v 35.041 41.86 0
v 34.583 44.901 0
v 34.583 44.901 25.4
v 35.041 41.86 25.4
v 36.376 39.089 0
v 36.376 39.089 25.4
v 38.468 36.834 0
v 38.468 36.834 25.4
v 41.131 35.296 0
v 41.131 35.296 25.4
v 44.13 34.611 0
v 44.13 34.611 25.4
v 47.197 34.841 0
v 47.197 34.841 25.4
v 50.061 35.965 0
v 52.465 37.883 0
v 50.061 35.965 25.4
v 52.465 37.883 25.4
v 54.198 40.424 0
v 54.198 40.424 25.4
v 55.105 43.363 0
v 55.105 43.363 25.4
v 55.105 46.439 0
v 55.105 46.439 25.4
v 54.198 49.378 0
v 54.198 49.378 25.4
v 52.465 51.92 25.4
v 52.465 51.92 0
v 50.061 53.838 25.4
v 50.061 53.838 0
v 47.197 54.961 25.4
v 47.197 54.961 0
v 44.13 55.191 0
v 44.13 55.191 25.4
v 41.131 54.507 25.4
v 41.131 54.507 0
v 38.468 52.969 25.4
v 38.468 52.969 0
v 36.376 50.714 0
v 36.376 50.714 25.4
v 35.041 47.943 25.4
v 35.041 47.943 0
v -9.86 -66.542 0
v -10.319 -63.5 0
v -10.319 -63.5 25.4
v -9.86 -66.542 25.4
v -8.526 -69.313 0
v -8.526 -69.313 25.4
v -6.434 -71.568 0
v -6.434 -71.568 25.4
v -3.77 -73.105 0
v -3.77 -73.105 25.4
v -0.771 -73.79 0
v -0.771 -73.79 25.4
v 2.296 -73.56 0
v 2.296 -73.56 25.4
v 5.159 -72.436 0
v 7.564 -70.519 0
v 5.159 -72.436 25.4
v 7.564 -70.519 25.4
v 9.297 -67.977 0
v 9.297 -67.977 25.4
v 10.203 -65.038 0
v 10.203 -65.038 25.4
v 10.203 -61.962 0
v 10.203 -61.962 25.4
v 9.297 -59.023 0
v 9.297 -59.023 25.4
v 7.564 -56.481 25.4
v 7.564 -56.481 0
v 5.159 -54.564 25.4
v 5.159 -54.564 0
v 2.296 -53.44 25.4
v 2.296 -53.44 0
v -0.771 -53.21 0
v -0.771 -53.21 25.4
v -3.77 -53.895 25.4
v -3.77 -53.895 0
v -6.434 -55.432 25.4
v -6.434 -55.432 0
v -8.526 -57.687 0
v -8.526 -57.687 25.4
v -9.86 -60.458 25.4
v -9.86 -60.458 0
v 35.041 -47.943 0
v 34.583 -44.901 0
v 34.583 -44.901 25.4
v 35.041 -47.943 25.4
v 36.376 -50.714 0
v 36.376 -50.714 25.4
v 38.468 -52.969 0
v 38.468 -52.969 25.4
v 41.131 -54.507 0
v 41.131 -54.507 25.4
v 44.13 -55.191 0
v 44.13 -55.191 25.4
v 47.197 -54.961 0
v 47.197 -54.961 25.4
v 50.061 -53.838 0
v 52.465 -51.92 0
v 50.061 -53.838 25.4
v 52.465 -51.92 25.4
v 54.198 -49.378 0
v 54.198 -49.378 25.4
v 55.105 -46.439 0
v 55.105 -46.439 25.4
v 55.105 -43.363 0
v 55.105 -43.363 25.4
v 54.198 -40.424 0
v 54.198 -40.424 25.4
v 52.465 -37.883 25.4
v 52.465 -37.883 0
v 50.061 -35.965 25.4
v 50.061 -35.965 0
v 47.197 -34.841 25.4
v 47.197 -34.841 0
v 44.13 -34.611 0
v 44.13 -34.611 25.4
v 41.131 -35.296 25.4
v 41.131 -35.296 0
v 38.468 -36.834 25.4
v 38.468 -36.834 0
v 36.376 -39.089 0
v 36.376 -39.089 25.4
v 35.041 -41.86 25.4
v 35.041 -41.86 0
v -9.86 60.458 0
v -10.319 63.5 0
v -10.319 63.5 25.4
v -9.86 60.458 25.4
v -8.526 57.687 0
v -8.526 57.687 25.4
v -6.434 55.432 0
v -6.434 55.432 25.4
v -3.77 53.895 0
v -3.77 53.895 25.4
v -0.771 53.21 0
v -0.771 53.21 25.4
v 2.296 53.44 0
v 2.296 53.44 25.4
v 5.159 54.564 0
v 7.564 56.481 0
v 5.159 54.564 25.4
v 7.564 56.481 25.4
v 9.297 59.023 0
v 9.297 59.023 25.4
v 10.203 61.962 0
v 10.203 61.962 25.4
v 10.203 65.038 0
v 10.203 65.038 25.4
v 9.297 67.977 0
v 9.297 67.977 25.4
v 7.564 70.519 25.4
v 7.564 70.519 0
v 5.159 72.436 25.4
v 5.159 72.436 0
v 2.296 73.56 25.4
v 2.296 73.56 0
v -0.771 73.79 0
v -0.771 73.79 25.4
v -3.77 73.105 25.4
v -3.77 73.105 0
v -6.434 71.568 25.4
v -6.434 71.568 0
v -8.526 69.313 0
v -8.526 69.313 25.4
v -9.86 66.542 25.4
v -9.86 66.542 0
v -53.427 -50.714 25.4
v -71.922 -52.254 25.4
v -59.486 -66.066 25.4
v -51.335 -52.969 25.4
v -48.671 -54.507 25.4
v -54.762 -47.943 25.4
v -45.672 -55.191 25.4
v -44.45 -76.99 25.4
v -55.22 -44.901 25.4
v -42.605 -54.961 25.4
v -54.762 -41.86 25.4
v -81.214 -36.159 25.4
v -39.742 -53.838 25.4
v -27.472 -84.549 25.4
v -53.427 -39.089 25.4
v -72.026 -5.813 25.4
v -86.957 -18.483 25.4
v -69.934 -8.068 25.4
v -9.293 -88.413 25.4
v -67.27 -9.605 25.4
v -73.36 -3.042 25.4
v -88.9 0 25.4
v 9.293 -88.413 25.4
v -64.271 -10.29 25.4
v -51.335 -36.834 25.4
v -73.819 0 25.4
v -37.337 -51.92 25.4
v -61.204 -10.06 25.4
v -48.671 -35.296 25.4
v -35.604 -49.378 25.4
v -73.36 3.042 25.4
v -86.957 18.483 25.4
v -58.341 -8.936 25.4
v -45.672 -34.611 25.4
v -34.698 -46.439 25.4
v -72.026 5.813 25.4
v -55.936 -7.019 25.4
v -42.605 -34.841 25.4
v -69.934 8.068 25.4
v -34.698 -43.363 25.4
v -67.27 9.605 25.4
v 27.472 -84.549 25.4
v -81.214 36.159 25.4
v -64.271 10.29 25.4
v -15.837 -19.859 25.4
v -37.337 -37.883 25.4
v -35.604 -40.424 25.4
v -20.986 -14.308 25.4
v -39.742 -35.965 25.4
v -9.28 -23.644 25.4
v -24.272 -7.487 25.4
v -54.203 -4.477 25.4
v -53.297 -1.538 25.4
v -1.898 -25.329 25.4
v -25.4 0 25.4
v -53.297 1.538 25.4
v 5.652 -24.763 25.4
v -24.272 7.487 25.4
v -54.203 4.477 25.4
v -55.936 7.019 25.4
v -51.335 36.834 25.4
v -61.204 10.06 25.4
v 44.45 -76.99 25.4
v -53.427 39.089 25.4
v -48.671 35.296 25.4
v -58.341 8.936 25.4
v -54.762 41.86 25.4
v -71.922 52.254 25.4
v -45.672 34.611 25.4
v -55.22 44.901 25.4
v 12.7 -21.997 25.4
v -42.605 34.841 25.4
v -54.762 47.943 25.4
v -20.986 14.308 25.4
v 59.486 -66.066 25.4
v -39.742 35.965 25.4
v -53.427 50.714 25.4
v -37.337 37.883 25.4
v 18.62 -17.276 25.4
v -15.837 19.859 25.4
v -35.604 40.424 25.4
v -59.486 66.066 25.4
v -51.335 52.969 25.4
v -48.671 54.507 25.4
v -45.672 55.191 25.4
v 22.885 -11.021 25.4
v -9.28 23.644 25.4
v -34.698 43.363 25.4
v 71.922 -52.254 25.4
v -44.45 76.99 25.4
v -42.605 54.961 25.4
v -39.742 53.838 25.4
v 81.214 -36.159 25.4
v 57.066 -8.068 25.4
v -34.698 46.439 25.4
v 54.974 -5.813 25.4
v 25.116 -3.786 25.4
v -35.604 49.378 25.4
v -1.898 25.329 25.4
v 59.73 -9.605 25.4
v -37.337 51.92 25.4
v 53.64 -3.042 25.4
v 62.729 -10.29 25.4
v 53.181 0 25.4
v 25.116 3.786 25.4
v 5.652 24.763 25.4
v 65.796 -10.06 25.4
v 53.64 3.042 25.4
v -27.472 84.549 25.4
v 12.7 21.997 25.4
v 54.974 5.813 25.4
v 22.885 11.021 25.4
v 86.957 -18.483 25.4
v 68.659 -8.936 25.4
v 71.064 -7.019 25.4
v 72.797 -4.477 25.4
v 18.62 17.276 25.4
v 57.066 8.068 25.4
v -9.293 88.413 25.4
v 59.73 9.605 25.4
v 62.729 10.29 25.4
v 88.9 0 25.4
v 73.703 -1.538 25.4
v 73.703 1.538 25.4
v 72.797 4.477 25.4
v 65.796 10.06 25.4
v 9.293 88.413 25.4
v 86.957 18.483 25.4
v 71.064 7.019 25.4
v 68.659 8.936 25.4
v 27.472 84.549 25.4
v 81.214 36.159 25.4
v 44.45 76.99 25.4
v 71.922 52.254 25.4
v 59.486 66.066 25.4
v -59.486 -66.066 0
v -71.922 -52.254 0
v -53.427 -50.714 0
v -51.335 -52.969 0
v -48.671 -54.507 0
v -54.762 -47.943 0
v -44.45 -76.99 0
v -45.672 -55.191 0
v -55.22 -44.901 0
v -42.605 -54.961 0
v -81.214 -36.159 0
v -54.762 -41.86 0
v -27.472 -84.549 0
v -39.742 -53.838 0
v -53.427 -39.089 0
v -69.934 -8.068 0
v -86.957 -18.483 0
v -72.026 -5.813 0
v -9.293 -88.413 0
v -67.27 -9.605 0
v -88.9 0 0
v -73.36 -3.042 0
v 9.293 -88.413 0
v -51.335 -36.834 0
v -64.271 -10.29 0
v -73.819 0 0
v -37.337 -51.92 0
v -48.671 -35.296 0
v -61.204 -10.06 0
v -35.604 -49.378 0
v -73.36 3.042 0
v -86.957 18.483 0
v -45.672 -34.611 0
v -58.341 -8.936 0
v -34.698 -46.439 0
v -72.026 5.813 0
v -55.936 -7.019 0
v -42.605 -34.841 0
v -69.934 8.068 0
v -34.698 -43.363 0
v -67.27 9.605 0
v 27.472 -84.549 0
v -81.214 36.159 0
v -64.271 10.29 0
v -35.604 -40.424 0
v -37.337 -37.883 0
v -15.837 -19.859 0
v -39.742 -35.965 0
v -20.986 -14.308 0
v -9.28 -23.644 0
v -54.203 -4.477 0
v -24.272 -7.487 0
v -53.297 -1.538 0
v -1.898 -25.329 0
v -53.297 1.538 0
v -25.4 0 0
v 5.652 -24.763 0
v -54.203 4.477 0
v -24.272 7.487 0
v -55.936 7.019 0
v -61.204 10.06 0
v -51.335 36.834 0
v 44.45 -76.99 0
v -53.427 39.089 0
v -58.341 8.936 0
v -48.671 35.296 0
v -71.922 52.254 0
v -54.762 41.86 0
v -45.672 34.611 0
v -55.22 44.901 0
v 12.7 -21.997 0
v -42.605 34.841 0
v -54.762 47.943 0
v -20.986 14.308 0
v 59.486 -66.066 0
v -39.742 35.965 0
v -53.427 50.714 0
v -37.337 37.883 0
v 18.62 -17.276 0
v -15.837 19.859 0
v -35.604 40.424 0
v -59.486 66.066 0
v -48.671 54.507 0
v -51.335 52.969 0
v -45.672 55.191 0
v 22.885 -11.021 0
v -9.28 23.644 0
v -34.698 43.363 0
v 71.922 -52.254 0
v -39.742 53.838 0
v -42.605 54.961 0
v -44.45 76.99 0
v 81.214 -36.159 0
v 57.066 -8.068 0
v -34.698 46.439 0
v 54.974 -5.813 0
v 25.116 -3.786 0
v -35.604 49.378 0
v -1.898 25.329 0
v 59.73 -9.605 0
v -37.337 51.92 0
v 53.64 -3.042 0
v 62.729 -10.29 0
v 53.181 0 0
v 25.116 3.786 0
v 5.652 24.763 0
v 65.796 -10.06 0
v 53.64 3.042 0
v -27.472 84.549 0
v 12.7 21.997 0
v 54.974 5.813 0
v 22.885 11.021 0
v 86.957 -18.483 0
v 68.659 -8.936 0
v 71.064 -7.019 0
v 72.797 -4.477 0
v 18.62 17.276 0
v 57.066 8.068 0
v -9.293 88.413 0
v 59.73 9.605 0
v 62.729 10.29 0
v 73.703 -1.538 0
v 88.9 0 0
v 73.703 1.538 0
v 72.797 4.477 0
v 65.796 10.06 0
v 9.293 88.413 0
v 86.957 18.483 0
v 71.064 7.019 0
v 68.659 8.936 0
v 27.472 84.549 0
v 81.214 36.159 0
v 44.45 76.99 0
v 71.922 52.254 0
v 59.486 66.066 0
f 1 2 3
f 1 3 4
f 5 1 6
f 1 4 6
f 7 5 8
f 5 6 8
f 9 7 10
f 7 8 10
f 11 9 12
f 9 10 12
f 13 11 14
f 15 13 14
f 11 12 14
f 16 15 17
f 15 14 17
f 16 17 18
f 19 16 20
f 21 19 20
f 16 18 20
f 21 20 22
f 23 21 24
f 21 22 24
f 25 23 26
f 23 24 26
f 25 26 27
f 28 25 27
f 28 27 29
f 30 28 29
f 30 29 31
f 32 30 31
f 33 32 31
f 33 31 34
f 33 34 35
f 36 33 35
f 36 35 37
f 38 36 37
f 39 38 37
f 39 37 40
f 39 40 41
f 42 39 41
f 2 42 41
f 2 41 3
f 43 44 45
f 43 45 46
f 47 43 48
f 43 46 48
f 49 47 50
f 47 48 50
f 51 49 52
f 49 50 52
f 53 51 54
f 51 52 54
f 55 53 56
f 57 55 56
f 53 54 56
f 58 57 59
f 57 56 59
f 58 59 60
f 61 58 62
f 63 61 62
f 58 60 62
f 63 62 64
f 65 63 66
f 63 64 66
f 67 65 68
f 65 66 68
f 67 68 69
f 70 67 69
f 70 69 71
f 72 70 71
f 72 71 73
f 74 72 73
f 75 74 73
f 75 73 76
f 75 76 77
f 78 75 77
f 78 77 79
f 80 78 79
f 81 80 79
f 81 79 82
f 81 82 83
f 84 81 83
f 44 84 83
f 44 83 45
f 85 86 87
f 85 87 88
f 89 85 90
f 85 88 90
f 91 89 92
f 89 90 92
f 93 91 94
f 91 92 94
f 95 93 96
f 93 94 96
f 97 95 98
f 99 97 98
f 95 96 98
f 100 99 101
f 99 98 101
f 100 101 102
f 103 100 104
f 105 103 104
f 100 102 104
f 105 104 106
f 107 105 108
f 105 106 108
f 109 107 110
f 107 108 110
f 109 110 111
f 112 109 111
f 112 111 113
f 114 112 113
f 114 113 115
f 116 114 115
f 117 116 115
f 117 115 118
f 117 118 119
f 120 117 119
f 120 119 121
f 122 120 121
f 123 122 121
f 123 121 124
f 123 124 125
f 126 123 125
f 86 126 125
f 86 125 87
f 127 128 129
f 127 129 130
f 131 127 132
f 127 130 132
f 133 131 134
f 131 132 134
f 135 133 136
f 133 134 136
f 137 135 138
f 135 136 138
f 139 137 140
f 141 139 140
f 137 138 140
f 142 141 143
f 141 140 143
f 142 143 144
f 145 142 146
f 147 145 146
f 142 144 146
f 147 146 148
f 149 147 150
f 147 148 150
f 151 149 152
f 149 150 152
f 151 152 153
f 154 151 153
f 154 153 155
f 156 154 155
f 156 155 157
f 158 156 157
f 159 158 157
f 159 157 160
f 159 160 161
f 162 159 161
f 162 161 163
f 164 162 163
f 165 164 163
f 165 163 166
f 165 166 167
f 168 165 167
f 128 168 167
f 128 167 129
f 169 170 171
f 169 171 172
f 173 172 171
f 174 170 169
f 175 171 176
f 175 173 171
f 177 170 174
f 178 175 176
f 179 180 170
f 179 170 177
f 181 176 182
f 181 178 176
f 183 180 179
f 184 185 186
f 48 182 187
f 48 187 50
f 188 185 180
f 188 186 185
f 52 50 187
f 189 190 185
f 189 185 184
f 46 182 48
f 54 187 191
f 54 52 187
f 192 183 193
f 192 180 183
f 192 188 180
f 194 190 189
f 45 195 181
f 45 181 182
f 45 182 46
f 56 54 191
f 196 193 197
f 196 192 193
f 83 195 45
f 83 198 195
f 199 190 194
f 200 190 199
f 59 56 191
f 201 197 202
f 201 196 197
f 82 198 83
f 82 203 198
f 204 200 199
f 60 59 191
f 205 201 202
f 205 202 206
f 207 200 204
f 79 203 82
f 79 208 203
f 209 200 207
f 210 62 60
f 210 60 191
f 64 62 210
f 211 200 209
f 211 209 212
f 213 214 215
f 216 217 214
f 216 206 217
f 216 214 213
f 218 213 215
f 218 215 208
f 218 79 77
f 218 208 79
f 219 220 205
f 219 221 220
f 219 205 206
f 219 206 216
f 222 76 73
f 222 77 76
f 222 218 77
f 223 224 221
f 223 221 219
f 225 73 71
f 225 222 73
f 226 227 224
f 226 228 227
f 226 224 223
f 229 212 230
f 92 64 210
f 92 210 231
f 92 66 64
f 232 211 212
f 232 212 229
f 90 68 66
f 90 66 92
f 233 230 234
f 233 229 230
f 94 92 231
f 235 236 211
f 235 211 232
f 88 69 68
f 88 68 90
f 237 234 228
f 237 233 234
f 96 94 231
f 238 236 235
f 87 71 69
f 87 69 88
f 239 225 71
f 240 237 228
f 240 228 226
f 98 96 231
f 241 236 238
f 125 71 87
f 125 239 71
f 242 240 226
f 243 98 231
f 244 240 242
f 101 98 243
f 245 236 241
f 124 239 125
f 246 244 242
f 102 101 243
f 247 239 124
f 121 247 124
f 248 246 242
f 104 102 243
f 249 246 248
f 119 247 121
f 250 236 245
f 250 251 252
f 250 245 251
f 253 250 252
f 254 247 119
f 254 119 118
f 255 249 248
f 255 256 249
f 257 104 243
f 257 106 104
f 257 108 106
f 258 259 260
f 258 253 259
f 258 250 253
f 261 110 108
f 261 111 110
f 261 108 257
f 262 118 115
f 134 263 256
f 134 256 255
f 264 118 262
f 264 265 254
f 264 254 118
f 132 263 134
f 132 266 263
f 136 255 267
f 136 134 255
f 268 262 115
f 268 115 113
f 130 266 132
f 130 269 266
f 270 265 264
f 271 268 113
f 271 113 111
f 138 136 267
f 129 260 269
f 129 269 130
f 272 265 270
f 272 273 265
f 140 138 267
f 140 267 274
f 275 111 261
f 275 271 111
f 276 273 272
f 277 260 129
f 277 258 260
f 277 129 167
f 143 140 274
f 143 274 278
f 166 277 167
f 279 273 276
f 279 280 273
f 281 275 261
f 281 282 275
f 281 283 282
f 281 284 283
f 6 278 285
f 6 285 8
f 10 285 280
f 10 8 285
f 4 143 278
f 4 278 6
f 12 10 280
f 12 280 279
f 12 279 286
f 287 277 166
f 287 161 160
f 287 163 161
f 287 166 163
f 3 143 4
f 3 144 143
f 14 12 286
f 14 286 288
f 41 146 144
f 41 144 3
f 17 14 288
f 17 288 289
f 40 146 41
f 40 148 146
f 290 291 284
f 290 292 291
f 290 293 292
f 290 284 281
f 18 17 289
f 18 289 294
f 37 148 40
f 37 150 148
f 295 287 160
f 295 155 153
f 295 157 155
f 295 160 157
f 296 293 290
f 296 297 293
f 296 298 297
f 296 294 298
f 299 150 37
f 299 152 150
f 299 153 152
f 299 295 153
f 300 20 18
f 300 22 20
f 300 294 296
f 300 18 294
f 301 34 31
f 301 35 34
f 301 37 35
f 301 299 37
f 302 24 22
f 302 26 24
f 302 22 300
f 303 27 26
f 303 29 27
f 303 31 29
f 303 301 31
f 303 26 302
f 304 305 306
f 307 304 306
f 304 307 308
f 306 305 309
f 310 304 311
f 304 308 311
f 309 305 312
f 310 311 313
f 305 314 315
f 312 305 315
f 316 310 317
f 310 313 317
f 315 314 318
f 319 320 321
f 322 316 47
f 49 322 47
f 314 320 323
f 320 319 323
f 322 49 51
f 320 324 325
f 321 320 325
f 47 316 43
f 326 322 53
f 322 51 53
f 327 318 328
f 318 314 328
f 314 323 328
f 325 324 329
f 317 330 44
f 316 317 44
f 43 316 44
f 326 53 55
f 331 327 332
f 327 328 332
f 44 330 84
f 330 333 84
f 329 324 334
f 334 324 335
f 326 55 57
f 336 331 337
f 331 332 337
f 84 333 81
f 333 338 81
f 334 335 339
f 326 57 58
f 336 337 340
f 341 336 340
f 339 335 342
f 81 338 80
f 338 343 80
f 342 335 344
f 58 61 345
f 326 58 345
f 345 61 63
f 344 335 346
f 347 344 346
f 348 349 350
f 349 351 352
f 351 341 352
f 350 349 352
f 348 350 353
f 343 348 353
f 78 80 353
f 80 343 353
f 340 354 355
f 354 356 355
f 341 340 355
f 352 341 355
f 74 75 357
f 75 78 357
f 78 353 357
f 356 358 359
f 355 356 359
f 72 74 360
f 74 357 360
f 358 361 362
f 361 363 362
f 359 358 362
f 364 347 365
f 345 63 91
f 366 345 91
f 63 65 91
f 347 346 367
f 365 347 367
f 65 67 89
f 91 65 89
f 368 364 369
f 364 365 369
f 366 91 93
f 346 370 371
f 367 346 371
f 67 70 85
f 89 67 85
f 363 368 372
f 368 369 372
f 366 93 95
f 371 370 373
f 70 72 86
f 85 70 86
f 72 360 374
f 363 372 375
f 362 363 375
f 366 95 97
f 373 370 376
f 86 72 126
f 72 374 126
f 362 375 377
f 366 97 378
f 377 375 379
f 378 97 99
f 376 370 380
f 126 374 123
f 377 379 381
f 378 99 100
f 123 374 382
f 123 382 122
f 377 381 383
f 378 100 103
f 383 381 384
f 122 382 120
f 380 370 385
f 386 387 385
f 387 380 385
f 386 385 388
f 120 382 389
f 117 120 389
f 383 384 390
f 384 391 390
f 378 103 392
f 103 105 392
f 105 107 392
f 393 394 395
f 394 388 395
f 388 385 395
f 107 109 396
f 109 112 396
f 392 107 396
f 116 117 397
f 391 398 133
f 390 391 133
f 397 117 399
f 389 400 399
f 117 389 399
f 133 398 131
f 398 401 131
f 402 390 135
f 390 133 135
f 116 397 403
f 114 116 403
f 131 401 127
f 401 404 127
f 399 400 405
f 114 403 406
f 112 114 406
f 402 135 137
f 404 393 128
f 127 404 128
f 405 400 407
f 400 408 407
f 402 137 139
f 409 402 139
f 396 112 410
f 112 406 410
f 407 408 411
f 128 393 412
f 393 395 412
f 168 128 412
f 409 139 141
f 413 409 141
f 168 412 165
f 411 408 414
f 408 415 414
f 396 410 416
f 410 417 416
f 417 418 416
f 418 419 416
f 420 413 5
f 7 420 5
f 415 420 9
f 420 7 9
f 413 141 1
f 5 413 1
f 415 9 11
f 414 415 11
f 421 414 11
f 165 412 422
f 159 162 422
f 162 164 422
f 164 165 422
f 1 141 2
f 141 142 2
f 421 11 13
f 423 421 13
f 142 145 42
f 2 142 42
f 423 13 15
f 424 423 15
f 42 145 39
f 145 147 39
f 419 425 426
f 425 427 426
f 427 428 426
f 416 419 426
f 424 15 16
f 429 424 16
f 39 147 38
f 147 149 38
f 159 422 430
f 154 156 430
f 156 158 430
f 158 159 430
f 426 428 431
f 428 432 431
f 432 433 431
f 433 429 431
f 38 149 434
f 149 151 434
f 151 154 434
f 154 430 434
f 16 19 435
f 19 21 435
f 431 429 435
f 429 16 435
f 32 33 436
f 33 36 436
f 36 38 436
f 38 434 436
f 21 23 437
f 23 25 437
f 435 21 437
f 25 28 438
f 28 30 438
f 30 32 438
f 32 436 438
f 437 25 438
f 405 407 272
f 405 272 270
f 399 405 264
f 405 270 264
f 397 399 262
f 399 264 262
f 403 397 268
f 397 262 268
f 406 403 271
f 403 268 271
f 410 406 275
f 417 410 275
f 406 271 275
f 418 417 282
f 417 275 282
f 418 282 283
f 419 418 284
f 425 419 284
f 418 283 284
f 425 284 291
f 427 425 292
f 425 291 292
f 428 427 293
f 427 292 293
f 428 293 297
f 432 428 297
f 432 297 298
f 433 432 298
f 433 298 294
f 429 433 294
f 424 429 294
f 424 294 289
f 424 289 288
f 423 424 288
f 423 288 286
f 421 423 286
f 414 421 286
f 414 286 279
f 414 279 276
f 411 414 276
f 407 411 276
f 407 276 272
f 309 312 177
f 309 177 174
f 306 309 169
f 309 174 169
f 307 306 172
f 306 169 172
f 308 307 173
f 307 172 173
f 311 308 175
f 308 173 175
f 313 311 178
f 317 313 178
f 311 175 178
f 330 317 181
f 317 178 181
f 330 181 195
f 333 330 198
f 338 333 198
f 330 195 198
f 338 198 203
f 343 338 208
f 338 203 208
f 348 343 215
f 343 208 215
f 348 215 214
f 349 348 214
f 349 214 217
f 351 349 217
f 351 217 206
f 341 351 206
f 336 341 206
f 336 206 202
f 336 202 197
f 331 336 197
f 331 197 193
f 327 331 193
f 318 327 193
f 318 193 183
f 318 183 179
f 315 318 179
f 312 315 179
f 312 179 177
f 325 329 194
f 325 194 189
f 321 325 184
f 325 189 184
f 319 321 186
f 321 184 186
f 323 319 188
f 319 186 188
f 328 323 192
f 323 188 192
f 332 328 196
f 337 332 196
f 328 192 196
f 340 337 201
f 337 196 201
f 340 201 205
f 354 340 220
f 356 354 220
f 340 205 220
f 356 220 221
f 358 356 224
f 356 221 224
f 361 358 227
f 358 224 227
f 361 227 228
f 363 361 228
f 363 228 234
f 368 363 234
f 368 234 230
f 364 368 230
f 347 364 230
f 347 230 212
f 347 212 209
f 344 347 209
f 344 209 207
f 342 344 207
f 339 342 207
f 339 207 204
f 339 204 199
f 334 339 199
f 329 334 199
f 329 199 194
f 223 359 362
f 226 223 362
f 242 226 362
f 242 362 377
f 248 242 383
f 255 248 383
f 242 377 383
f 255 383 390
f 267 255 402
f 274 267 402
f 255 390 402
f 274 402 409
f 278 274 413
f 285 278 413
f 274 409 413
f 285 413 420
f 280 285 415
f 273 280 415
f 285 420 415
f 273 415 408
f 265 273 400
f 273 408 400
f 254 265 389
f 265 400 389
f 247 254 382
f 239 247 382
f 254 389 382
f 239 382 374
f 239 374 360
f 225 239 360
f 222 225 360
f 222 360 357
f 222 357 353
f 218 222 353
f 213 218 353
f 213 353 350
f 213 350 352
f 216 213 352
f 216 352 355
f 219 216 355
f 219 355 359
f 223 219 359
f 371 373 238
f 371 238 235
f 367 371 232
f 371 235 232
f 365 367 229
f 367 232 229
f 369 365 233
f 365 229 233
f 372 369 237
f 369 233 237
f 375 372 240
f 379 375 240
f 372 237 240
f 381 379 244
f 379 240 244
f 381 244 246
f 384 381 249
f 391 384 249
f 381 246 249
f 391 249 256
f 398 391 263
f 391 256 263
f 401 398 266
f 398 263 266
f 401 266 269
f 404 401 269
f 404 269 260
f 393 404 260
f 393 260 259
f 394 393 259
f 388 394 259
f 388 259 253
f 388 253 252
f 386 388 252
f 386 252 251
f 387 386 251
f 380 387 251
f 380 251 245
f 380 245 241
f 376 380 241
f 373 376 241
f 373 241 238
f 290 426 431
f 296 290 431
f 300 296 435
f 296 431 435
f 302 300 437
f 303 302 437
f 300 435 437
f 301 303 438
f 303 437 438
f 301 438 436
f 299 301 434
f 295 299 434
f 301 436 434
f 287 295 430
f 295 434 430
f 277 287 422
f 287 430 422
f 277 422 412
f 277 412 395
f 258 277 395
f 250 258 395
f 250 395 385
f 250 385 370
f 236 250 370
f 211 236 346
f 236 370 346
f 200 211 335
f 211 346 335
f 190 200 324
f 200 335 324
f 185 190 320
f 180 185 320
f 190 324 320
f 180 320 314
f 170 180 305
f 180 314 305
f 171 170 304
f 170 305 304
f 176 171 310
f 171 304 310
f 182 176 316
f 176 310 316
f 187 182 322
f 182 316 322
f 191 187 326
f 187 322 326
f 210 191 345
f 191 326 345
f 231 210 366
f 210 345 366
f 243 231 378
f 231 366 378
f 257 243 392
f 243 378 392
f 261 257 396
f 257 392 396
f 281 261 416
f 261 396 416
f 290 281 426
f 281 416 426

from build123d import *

# Parameters (mm, degrees)
F0_R     = 88.9
F1_DEPTH = 25.4
F2_D     = 20.6375
F4_D     = 50.8


# Not quite as in the source:
# - a feature names something its author has since deleted; it is built from what else it names


with BuildPart() as f1:
    # F0 (on Top) → F1 (new body)
    with BuildSketch(Plane.XY):
        Circle(F0_R)
    extrude(amount=F1_DEPTH)

    # F2 (through all)
    with Locations(Plane(origin=(0, 0, 0), x_dir=(1, 0, 0), z_dir=(0, 0, -1))):
        with Locations((0, -63.5), (-44.9012806053, -44.9012806053), (-63.5, 0), (-44.9012806053, 44.9012806053), (44.9012806053, 44.9012806053), (0, 63.5), (63.5, 0), (44.9012806053, -44.9012806053)):
            Hole(F2_D / 2)

    # F4 (through all)
    with Locations(Plane.XY.offset(25.4)):
        with Locations((0, 0)):
            Hole(F4_D / 2)


solid = f1.part
